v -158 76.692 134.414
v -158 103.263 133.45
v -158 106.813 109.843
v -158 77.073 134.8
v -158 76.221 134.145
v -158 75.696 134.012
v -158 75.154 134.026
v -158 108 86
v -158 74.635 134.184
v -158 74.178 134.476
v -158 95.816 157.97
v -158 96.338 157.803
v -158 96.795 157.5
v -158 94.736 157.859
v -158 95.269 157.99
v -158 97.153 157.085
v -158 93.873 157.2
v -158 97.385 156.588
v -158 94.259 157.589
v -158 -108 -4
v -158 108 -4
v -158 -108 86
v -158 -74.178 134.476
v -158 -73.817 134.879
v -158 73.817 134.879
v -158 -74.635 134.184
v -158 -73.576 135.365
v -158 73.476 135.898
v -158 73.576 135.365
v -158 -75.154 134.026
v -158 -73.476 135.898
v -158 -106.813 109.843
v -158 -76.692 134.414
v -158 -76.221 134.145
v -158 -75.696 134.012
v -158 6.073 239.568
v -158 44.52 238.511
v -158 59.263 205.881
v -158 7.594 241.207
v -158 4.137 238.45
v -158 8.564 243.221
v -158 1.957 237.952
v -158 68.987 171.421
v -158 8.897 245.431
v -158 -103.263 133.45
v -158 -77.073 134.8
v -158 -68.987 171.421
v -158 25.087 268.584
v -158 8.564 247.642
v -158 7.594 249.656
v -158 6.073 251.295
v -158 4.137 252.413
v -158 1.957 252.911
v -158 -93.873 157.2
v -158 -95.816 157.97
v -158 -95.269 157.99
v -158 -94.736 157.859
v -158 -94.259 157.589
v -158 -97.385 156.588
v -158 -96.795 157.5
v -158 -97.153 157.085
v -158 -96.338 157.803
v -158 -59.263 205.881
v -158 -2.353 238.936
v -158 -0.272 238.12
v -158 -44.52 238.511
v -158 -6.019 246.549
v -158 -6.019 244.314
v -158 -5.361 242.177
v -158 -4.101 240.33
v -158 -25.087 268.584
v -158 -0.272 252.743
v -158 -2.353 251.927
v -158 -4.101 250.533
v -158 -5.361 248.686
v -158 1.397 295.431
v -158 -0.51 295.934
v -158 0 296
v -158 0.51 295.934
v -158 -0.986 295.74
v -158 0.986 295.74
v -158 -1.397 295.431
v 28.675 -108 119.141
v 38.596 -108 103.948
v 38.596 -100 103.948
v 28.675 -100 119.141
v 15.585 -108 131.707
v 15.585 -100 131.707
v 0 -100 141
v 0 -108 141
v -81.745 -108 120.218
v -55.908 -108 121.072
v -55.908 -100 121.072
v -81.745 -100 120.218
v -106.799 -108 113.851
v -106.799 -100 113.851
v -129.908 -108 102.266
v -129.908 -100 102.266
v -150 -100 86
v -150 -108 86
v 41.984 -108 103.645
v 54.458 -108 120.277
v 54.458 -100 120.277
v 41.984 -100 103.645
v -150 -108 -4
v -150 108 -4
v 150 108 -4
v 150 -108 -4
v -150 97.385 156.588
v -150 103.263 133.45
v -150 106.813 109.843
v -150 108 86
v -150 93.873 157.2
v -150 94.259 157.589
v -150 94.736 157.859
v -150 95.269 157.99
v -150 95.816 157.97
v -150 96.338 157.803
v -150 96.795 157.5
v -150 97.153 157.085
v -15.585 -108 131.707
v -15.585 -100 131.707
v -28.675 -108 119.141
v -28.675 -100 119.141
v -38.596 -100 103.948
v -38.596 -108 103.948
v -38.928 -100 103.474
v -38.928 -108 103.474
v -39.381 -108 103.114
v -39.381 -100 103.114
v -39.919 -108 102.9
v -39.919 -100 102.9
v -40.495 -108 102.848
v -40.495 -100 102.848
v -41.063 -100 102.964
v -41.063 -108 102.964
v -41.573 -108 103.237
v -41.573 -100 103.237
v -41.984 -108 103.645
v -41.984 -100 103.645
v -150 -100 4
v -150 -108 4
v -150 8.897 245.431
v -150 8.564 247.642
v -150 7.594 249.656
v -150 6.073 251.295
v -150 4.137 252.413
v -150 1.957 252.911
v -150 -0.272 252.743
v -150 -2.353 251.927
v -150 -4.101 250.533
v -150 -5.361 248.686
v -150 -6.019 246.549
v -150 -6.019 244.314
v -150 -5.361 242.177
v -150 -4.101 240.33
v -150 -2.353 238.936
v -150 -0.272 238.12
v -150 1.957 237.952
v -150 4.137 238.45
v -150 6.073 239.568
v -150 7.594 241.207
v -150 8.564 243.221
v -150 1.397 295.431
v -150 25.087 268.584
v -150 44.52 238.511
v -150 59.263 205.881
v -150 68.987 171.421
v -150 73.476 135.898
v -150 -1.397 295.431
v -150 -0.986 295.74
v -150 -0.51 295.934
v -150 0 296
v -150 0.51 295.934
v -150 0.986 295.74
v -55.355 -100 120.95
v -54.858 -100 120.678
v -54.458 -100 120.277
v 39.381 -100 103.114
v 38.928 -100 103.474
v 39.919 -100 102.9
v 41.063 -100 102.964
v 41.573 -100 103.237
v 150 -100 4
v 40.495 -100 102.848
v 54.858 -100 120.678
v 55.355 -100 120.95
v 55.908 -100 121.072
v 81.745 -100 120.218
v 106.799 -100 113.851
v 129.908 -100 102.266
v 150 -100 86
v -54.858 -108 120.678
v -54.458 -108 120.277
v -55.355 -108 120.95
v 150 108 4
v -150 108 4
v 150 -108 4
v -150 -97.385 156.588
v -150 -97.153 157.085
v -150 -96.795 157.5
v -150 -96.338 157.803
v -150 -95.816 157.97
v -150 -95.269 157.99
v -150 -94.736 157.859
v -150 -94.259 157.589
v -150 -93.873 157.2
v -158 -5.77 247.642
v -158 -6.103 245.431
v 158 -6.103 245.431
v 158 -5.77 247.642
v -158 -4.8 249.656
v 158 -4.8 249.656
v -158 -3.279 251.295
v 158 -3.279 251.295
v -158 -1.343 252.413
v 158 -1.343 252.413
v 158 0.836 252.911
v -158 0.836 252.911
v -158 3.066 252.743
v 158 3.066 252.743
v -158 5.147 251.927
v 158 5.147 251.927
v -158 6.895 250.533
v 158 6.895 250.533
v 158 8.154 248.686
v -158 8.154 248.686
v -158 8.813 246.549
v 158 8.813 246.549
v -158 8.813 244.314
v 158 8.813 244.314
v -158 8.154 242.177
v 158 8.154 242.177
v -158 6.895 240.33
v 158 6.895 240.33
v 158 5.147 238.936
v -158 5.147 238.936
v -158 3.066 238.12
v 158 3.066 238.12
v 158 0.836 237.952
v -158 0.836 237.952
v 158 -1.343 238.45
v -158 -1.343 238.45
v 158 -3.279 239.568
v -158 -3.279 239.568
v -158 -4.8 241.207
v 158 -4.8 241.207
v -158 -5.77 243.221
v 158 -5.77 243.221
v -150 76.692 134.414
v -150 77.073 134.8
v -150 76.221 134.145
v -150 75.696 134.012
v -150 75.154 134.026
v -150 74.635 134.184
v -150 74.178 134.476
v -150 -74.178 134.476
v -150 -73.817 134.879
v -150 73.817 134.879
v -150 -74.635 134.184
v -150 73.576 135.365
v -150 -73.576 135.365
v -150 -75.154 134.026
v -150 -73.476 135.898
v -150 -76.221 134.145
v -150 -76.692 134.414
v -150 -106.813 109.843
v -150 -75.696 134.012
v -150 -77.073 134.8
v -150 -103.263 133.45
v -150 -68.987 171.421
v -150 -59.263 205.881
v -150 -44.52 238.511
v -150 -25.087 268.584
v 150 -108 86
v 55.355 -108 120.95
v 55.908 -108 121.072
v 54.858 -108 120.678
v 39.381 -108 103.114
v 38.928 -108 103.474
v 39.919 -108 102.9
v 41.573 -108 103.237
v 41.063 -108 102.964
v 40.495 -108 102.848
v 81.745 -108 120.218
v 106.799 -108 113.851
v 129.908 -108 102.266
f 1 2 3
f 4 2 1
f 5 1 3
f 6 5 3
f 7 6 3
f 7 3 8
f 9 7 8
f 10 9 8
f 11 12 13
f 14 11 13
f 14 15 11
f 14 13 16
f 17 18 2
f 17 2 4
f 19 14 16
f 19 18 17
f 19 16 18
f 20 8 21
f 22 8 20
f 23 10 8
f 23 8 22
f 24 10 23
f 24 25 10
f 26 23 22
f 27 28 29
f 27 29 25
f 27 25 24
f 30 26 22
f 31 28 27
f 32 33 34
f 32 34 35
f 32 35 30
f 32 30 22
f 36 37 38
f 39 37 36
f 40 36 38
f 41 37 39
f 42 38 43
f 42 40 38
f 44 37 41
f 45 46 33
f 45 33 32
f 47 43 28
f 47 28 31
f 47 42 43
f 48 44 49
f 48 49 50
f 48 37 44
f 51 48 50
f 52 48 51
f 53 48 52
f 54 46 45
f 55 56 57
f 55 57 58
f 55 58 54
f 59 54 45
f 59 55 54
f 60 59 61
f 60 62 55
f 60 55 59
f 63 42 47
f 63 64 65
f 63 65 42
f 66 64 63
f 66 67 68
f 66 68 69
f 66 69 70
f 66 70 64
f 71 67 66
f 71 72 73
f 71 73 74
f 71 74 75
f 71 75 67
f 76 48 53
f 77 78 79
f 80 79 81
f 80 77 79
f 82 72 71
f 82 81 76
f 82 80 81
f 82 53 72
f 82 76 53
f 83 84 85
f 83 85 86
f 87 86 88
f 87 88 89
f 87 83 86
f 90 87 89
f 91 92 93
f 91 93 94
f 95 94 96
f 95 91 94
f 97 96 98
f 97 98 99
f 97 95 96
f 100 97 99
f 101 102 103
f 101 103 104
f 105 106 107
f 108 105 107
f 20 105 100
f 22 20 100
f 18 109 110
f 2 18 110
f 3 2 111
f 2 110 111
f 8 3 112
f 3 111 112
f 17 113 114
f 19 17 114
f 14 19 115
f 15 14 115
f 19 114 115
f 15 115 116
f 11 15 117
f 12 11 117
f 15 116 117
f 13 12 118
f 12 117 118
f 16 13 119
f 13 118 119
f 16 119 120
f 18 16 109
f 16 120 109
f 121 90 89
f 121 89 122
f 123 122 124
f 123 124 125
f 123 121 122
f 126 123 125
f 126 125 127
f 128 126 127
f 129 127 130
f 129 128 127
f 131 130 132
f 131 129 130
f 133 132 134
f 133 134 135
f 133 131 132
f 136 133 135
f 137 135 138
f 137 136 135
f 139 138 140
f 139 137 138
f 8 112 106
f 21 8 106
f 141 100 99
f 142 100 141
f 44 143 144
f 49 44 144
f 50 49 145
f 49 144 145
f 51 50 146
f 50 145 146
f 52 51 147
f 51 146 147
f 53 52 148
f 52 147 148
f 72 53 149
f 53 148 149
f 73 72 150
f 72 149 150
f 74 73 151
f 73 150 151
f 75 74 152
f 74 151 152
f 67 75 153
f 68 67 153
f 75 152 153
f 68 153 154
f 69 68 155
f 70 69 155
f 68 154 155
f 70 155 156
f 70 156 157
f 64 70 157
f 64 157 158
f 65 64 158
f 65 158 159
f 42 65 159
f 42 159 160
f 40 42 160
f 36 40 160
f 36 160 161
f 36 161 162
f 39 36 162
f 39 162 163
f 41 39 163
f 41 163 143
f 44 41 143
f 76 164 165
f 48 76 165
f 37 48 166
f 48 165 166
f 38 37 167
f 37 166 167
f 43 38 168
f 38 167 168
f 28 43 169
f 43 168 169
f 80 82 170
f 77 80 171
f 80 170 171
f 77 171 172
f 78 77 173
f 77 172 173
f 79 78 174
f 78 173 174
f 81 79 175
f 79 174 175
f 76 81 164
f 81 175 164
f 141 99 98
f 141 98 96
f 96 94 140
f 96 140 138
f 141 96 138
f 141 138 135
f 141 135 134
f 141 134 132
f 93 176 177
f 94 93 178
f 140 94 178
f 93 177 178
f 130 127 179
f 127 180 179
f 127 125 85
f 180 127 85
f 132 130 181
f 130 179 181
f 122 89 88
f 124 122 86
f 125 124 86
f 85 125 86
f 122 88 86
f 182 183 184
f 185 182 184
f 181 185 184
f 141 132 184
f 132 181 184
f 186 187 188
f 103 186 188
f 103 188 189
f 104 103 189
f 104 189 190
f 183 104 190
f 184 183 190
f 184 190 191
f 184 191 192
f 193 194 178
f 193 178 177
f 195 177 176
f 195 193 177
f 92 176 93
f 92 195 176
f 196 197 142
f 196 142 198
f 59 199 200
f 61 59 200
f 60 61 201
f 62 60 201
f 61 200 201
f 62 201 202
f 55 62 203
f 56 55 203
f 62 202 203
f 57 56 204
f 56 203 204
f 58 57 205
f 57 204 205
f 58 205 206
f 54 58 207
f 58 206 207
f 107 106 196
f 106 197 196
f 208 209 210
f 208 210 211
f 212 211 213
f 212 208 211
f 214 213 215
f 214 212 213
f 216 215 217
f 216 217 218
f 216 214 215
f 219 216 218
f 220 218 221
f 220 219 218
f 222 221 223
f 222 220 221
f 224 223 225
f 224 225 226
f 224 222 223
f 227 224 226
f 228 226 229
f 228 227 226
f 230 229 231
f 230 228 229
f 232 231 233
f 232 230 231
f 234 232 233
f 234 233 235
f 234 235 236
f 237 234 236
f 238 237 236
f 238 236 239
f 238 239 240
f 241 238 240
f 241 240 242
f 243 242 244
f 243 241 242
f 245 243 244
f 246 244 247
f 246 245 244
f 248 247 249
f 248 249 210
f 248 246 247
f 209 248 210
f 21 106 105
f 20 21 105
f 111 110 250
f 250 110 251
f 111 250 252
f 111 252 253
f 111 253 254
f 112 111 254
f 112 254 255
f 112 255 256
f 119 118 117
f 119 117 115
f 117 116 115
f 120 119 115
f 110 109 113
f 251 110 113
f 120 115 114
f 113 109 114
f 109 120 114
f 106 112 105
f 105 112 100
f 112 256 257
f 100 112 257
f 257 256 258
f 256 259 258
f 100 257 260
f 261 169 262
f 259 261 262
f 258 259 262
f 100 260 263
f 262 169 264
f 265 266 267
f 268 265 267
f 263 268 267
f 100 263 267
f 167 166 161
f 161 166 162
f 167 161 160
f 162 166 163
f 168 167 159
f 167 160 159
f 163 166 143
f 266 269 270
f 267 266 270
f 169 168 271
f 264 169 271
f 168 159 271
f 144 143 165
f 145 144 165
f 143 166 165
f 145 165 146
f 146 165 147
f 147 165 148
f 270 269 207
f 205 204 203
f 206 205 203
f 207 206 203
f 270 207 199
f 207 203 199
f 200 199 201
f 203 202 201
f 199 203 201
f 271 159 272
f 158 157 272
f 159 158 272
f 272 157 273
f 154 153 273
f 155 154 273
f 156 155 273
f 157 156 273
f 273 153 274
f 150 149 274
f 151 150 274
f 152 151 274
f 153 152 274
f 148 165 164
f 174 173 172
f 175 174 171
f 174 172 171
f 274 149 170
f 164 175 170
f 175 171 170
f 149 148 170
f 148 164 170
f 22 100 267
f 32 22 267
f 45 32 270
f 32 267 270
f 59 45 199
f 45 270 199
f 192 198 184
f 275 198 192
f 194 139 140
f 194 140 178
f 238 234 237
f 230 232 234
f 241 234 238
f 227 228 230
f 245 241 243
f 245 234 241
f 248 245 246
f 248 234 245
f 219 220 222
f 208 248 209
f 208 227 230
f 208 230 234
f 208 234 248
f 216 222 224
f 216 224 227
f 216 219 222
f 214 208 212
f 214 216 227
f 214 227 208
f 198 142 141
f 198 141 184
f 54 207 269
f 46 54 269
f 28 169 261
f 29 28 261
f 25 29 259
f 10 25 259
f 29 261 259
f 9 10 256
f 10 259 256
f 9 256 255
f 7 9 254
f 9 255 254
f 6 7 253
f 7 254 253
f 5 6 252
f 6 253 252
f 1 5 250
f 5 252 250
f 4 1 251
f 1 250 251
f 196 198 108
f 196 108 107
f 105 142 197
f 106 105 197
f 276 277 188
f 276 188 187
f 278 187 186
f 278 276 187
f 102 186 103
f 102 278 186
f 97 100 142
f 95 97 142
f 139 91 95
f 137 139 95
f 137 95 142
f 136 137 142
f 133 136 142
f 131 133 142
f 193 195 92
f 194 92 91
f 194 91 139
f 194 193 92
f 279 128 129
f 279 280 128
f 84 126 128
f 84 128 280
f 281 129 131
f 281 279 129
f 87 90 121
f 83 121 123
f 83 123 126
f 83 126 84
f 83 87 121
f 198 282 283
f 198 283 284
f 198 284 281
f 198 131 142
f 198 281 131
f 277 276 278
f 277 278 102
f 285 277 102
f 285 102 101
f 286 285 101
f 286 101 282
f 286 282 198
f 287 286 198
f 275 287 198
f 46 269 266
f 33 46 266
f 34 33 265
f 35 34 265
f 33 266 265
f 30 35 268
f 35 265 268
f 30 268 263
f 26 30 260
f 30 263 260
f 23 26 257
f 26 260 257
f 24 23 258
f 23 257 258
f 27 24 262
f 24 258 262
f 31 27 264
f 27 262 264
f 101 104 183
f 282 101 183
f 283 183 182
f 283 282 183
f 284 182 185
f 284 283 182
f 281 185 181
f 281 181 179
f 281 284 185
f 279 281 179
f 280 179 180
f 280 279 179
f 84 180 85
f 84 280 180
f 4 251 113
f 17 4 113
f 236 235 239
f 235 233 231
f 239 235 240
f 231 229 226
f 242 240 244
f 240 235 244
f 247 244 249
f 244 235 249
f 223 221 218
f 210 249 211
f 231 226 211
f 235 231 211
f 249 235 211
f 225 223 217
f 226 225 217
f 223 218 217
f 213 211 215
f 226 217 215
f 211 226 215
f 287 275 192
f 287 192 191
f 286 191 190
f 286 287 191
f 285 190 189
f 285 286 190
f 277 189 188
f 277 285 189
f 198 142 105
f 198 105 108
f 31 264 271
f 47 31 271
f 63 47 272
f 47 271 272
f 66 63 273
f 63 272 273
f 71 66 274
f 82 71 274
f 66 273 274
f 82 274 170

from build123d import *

# Parameters (mm, degrees)
F3_W      = 300
F3_H      = 216
F4_DEPTH  = 4
F7_DEPTH  = 8
F9_D      = 15
F11_DEPTH = 8
F12_R     = 7.5
F13_DEPTH = 316


with BuildPart() as f4:
    # F3 (on Top) → F4 (new body, symmetric)
    with BuildSketch(Plane.XY):
        Rectangle(F3_W, F3_H)
    extrude(amount=F4_DEPTH, both=True)


with BuildPart() as f7:
    # F6 (on face) → F7 (new body)
    with BuildSketch(Plane(origin=(-150, 0, 0), x_dir=(0, -1, 0), z_dir=(-1, 0, 0))):
        with BuildLine():
            Line((-108, -4), (108, -4))
            Line((108, -4), (108, 86))
            ThreePointArc((108, 86), (105.3313162087, 121.6909841087), (97.384613778, 156.5882352941))
            ThreePointArc((97.384613778, 156.5882352941), (95.8163362583, 157.9703227997), (93.8730753298, 157.2))
            Line((93.8730753298, 157.2), (77.0730753298, 134.8))
            ThreePointArc((77.0730753298, 134.8), (74.8892385473, 134.0871135393), (73.4756795548, 135.8979700143))
            ThreePointArc((73.4756795548, 135.8979700143), (52.500901807, 222.4711121462), (1.3967379281, 295.4314758678))
            ThreePointArc((1.3967379281, 295.4314758678), (0, 296), (-1.3967379281, 295.4314758678))
            ThreePointArc((-1.3967379281, 295.4314758678), (-52.500901807, 222.4711121462), (-73.4756795548, 135.8979700143))
            ThreePointArc((-73.4756795548, 135.8979700143), (-74.8892385473, 134.0871135393), (-77.0730753298, 134.8))
            Line((-77.0730753298, 134.8), (-93.8730753298, 157.2))
            ThreePointArc((-93.8730753298, 157.2), (-95.8163362583, 157.9703227997), (-97.384613778, 156.5882352941))
            ThreePointArc((-97.384613778, 156.5882352941), (-105.3313162087, 121.6909841087), (-108, 86))
            Line((-108, 86), (-108, -4))
        make_face()
    extrude(amount=F7_DEPTH)

    # F9 (through all)
    with Locations(Plane(origin=(-158, 0, 0), x_dir=(0, -1, 0), z_dir=(-1, 0, 0))):
        with Locations((-1.3967379281, 245.4314758678)):
            Hole(F9_D / 2)


with BuildPart() as f11:
    # F10 (on face) → F11 (new body)
    with BuildSketch(Plane.XZ.offset(108)):
        with BuildLine():
            Line((-150, 86), (-150, 4))
            Line((-150, 4), (0, 4))
            Line((0, 4), (150, 4))
            Line((150, 4), (150, 86))
            ThreePointArc((150, 86), (106.7989638121, 113.8508882696), (55.908271761, 121.0716200659))
            ThreePointArc((55.908271761, 121.0716200659), (55.0971481355, 120.8313410356), (54.4579199256, 120.2772265674))
            Line((54.4579199256, 120.2772265674), (41.9837086168, 103.6449448224))
            ThreePointArc((41.9837086168, 103.6449448224), (40.2052990098, 102.8529182131), (38.5959345964, 103.9483601628))
            ThreePointArc((38.5959345964, 103.9483601628), (22.4871641318, 125.7963011251), (0, 141))
            ThreePointArc((0, 141), (-22.4871641318, 125.7963011251), (-38.5959345964, 103.9483601628))
            ThreePointArc((-38.5959345964, 103.9483601628), (-40.2052990098, 102.8529182131), (-41.9837086168, 103.6449448224))
            Line((-41.9837086168, 103.6449448224), (-54.4579199256, 120.2772265674))
            ThreePointArc((-54.4579199256, 120.2772265674), (-55.0971481355, 120.8313410356), (-55.908271761, 121.0716200659))
            ThreePointArc((-55.908271761, 121.0716200659), (-106.7989638121, 113.8508882696), (-150, 86))
        make_face()
    extrude(amount=-F11_DEPTH)


with BuildPart() as f13:
    # F12 (on face) → F13 (new body)
    with BuildSketch(Plane(origin=(-158, 0, 0), x_dir=(0, -1, 0), z_dir=(-1, 0, 0))):
        with Locations((-1.3967379281, 245.4314758678)):
            Circle(F12_R)
    extrude(amount=-F13_DEPTH)


solid = Compound([f4.part, f7.part, f11.part, f13.part])
